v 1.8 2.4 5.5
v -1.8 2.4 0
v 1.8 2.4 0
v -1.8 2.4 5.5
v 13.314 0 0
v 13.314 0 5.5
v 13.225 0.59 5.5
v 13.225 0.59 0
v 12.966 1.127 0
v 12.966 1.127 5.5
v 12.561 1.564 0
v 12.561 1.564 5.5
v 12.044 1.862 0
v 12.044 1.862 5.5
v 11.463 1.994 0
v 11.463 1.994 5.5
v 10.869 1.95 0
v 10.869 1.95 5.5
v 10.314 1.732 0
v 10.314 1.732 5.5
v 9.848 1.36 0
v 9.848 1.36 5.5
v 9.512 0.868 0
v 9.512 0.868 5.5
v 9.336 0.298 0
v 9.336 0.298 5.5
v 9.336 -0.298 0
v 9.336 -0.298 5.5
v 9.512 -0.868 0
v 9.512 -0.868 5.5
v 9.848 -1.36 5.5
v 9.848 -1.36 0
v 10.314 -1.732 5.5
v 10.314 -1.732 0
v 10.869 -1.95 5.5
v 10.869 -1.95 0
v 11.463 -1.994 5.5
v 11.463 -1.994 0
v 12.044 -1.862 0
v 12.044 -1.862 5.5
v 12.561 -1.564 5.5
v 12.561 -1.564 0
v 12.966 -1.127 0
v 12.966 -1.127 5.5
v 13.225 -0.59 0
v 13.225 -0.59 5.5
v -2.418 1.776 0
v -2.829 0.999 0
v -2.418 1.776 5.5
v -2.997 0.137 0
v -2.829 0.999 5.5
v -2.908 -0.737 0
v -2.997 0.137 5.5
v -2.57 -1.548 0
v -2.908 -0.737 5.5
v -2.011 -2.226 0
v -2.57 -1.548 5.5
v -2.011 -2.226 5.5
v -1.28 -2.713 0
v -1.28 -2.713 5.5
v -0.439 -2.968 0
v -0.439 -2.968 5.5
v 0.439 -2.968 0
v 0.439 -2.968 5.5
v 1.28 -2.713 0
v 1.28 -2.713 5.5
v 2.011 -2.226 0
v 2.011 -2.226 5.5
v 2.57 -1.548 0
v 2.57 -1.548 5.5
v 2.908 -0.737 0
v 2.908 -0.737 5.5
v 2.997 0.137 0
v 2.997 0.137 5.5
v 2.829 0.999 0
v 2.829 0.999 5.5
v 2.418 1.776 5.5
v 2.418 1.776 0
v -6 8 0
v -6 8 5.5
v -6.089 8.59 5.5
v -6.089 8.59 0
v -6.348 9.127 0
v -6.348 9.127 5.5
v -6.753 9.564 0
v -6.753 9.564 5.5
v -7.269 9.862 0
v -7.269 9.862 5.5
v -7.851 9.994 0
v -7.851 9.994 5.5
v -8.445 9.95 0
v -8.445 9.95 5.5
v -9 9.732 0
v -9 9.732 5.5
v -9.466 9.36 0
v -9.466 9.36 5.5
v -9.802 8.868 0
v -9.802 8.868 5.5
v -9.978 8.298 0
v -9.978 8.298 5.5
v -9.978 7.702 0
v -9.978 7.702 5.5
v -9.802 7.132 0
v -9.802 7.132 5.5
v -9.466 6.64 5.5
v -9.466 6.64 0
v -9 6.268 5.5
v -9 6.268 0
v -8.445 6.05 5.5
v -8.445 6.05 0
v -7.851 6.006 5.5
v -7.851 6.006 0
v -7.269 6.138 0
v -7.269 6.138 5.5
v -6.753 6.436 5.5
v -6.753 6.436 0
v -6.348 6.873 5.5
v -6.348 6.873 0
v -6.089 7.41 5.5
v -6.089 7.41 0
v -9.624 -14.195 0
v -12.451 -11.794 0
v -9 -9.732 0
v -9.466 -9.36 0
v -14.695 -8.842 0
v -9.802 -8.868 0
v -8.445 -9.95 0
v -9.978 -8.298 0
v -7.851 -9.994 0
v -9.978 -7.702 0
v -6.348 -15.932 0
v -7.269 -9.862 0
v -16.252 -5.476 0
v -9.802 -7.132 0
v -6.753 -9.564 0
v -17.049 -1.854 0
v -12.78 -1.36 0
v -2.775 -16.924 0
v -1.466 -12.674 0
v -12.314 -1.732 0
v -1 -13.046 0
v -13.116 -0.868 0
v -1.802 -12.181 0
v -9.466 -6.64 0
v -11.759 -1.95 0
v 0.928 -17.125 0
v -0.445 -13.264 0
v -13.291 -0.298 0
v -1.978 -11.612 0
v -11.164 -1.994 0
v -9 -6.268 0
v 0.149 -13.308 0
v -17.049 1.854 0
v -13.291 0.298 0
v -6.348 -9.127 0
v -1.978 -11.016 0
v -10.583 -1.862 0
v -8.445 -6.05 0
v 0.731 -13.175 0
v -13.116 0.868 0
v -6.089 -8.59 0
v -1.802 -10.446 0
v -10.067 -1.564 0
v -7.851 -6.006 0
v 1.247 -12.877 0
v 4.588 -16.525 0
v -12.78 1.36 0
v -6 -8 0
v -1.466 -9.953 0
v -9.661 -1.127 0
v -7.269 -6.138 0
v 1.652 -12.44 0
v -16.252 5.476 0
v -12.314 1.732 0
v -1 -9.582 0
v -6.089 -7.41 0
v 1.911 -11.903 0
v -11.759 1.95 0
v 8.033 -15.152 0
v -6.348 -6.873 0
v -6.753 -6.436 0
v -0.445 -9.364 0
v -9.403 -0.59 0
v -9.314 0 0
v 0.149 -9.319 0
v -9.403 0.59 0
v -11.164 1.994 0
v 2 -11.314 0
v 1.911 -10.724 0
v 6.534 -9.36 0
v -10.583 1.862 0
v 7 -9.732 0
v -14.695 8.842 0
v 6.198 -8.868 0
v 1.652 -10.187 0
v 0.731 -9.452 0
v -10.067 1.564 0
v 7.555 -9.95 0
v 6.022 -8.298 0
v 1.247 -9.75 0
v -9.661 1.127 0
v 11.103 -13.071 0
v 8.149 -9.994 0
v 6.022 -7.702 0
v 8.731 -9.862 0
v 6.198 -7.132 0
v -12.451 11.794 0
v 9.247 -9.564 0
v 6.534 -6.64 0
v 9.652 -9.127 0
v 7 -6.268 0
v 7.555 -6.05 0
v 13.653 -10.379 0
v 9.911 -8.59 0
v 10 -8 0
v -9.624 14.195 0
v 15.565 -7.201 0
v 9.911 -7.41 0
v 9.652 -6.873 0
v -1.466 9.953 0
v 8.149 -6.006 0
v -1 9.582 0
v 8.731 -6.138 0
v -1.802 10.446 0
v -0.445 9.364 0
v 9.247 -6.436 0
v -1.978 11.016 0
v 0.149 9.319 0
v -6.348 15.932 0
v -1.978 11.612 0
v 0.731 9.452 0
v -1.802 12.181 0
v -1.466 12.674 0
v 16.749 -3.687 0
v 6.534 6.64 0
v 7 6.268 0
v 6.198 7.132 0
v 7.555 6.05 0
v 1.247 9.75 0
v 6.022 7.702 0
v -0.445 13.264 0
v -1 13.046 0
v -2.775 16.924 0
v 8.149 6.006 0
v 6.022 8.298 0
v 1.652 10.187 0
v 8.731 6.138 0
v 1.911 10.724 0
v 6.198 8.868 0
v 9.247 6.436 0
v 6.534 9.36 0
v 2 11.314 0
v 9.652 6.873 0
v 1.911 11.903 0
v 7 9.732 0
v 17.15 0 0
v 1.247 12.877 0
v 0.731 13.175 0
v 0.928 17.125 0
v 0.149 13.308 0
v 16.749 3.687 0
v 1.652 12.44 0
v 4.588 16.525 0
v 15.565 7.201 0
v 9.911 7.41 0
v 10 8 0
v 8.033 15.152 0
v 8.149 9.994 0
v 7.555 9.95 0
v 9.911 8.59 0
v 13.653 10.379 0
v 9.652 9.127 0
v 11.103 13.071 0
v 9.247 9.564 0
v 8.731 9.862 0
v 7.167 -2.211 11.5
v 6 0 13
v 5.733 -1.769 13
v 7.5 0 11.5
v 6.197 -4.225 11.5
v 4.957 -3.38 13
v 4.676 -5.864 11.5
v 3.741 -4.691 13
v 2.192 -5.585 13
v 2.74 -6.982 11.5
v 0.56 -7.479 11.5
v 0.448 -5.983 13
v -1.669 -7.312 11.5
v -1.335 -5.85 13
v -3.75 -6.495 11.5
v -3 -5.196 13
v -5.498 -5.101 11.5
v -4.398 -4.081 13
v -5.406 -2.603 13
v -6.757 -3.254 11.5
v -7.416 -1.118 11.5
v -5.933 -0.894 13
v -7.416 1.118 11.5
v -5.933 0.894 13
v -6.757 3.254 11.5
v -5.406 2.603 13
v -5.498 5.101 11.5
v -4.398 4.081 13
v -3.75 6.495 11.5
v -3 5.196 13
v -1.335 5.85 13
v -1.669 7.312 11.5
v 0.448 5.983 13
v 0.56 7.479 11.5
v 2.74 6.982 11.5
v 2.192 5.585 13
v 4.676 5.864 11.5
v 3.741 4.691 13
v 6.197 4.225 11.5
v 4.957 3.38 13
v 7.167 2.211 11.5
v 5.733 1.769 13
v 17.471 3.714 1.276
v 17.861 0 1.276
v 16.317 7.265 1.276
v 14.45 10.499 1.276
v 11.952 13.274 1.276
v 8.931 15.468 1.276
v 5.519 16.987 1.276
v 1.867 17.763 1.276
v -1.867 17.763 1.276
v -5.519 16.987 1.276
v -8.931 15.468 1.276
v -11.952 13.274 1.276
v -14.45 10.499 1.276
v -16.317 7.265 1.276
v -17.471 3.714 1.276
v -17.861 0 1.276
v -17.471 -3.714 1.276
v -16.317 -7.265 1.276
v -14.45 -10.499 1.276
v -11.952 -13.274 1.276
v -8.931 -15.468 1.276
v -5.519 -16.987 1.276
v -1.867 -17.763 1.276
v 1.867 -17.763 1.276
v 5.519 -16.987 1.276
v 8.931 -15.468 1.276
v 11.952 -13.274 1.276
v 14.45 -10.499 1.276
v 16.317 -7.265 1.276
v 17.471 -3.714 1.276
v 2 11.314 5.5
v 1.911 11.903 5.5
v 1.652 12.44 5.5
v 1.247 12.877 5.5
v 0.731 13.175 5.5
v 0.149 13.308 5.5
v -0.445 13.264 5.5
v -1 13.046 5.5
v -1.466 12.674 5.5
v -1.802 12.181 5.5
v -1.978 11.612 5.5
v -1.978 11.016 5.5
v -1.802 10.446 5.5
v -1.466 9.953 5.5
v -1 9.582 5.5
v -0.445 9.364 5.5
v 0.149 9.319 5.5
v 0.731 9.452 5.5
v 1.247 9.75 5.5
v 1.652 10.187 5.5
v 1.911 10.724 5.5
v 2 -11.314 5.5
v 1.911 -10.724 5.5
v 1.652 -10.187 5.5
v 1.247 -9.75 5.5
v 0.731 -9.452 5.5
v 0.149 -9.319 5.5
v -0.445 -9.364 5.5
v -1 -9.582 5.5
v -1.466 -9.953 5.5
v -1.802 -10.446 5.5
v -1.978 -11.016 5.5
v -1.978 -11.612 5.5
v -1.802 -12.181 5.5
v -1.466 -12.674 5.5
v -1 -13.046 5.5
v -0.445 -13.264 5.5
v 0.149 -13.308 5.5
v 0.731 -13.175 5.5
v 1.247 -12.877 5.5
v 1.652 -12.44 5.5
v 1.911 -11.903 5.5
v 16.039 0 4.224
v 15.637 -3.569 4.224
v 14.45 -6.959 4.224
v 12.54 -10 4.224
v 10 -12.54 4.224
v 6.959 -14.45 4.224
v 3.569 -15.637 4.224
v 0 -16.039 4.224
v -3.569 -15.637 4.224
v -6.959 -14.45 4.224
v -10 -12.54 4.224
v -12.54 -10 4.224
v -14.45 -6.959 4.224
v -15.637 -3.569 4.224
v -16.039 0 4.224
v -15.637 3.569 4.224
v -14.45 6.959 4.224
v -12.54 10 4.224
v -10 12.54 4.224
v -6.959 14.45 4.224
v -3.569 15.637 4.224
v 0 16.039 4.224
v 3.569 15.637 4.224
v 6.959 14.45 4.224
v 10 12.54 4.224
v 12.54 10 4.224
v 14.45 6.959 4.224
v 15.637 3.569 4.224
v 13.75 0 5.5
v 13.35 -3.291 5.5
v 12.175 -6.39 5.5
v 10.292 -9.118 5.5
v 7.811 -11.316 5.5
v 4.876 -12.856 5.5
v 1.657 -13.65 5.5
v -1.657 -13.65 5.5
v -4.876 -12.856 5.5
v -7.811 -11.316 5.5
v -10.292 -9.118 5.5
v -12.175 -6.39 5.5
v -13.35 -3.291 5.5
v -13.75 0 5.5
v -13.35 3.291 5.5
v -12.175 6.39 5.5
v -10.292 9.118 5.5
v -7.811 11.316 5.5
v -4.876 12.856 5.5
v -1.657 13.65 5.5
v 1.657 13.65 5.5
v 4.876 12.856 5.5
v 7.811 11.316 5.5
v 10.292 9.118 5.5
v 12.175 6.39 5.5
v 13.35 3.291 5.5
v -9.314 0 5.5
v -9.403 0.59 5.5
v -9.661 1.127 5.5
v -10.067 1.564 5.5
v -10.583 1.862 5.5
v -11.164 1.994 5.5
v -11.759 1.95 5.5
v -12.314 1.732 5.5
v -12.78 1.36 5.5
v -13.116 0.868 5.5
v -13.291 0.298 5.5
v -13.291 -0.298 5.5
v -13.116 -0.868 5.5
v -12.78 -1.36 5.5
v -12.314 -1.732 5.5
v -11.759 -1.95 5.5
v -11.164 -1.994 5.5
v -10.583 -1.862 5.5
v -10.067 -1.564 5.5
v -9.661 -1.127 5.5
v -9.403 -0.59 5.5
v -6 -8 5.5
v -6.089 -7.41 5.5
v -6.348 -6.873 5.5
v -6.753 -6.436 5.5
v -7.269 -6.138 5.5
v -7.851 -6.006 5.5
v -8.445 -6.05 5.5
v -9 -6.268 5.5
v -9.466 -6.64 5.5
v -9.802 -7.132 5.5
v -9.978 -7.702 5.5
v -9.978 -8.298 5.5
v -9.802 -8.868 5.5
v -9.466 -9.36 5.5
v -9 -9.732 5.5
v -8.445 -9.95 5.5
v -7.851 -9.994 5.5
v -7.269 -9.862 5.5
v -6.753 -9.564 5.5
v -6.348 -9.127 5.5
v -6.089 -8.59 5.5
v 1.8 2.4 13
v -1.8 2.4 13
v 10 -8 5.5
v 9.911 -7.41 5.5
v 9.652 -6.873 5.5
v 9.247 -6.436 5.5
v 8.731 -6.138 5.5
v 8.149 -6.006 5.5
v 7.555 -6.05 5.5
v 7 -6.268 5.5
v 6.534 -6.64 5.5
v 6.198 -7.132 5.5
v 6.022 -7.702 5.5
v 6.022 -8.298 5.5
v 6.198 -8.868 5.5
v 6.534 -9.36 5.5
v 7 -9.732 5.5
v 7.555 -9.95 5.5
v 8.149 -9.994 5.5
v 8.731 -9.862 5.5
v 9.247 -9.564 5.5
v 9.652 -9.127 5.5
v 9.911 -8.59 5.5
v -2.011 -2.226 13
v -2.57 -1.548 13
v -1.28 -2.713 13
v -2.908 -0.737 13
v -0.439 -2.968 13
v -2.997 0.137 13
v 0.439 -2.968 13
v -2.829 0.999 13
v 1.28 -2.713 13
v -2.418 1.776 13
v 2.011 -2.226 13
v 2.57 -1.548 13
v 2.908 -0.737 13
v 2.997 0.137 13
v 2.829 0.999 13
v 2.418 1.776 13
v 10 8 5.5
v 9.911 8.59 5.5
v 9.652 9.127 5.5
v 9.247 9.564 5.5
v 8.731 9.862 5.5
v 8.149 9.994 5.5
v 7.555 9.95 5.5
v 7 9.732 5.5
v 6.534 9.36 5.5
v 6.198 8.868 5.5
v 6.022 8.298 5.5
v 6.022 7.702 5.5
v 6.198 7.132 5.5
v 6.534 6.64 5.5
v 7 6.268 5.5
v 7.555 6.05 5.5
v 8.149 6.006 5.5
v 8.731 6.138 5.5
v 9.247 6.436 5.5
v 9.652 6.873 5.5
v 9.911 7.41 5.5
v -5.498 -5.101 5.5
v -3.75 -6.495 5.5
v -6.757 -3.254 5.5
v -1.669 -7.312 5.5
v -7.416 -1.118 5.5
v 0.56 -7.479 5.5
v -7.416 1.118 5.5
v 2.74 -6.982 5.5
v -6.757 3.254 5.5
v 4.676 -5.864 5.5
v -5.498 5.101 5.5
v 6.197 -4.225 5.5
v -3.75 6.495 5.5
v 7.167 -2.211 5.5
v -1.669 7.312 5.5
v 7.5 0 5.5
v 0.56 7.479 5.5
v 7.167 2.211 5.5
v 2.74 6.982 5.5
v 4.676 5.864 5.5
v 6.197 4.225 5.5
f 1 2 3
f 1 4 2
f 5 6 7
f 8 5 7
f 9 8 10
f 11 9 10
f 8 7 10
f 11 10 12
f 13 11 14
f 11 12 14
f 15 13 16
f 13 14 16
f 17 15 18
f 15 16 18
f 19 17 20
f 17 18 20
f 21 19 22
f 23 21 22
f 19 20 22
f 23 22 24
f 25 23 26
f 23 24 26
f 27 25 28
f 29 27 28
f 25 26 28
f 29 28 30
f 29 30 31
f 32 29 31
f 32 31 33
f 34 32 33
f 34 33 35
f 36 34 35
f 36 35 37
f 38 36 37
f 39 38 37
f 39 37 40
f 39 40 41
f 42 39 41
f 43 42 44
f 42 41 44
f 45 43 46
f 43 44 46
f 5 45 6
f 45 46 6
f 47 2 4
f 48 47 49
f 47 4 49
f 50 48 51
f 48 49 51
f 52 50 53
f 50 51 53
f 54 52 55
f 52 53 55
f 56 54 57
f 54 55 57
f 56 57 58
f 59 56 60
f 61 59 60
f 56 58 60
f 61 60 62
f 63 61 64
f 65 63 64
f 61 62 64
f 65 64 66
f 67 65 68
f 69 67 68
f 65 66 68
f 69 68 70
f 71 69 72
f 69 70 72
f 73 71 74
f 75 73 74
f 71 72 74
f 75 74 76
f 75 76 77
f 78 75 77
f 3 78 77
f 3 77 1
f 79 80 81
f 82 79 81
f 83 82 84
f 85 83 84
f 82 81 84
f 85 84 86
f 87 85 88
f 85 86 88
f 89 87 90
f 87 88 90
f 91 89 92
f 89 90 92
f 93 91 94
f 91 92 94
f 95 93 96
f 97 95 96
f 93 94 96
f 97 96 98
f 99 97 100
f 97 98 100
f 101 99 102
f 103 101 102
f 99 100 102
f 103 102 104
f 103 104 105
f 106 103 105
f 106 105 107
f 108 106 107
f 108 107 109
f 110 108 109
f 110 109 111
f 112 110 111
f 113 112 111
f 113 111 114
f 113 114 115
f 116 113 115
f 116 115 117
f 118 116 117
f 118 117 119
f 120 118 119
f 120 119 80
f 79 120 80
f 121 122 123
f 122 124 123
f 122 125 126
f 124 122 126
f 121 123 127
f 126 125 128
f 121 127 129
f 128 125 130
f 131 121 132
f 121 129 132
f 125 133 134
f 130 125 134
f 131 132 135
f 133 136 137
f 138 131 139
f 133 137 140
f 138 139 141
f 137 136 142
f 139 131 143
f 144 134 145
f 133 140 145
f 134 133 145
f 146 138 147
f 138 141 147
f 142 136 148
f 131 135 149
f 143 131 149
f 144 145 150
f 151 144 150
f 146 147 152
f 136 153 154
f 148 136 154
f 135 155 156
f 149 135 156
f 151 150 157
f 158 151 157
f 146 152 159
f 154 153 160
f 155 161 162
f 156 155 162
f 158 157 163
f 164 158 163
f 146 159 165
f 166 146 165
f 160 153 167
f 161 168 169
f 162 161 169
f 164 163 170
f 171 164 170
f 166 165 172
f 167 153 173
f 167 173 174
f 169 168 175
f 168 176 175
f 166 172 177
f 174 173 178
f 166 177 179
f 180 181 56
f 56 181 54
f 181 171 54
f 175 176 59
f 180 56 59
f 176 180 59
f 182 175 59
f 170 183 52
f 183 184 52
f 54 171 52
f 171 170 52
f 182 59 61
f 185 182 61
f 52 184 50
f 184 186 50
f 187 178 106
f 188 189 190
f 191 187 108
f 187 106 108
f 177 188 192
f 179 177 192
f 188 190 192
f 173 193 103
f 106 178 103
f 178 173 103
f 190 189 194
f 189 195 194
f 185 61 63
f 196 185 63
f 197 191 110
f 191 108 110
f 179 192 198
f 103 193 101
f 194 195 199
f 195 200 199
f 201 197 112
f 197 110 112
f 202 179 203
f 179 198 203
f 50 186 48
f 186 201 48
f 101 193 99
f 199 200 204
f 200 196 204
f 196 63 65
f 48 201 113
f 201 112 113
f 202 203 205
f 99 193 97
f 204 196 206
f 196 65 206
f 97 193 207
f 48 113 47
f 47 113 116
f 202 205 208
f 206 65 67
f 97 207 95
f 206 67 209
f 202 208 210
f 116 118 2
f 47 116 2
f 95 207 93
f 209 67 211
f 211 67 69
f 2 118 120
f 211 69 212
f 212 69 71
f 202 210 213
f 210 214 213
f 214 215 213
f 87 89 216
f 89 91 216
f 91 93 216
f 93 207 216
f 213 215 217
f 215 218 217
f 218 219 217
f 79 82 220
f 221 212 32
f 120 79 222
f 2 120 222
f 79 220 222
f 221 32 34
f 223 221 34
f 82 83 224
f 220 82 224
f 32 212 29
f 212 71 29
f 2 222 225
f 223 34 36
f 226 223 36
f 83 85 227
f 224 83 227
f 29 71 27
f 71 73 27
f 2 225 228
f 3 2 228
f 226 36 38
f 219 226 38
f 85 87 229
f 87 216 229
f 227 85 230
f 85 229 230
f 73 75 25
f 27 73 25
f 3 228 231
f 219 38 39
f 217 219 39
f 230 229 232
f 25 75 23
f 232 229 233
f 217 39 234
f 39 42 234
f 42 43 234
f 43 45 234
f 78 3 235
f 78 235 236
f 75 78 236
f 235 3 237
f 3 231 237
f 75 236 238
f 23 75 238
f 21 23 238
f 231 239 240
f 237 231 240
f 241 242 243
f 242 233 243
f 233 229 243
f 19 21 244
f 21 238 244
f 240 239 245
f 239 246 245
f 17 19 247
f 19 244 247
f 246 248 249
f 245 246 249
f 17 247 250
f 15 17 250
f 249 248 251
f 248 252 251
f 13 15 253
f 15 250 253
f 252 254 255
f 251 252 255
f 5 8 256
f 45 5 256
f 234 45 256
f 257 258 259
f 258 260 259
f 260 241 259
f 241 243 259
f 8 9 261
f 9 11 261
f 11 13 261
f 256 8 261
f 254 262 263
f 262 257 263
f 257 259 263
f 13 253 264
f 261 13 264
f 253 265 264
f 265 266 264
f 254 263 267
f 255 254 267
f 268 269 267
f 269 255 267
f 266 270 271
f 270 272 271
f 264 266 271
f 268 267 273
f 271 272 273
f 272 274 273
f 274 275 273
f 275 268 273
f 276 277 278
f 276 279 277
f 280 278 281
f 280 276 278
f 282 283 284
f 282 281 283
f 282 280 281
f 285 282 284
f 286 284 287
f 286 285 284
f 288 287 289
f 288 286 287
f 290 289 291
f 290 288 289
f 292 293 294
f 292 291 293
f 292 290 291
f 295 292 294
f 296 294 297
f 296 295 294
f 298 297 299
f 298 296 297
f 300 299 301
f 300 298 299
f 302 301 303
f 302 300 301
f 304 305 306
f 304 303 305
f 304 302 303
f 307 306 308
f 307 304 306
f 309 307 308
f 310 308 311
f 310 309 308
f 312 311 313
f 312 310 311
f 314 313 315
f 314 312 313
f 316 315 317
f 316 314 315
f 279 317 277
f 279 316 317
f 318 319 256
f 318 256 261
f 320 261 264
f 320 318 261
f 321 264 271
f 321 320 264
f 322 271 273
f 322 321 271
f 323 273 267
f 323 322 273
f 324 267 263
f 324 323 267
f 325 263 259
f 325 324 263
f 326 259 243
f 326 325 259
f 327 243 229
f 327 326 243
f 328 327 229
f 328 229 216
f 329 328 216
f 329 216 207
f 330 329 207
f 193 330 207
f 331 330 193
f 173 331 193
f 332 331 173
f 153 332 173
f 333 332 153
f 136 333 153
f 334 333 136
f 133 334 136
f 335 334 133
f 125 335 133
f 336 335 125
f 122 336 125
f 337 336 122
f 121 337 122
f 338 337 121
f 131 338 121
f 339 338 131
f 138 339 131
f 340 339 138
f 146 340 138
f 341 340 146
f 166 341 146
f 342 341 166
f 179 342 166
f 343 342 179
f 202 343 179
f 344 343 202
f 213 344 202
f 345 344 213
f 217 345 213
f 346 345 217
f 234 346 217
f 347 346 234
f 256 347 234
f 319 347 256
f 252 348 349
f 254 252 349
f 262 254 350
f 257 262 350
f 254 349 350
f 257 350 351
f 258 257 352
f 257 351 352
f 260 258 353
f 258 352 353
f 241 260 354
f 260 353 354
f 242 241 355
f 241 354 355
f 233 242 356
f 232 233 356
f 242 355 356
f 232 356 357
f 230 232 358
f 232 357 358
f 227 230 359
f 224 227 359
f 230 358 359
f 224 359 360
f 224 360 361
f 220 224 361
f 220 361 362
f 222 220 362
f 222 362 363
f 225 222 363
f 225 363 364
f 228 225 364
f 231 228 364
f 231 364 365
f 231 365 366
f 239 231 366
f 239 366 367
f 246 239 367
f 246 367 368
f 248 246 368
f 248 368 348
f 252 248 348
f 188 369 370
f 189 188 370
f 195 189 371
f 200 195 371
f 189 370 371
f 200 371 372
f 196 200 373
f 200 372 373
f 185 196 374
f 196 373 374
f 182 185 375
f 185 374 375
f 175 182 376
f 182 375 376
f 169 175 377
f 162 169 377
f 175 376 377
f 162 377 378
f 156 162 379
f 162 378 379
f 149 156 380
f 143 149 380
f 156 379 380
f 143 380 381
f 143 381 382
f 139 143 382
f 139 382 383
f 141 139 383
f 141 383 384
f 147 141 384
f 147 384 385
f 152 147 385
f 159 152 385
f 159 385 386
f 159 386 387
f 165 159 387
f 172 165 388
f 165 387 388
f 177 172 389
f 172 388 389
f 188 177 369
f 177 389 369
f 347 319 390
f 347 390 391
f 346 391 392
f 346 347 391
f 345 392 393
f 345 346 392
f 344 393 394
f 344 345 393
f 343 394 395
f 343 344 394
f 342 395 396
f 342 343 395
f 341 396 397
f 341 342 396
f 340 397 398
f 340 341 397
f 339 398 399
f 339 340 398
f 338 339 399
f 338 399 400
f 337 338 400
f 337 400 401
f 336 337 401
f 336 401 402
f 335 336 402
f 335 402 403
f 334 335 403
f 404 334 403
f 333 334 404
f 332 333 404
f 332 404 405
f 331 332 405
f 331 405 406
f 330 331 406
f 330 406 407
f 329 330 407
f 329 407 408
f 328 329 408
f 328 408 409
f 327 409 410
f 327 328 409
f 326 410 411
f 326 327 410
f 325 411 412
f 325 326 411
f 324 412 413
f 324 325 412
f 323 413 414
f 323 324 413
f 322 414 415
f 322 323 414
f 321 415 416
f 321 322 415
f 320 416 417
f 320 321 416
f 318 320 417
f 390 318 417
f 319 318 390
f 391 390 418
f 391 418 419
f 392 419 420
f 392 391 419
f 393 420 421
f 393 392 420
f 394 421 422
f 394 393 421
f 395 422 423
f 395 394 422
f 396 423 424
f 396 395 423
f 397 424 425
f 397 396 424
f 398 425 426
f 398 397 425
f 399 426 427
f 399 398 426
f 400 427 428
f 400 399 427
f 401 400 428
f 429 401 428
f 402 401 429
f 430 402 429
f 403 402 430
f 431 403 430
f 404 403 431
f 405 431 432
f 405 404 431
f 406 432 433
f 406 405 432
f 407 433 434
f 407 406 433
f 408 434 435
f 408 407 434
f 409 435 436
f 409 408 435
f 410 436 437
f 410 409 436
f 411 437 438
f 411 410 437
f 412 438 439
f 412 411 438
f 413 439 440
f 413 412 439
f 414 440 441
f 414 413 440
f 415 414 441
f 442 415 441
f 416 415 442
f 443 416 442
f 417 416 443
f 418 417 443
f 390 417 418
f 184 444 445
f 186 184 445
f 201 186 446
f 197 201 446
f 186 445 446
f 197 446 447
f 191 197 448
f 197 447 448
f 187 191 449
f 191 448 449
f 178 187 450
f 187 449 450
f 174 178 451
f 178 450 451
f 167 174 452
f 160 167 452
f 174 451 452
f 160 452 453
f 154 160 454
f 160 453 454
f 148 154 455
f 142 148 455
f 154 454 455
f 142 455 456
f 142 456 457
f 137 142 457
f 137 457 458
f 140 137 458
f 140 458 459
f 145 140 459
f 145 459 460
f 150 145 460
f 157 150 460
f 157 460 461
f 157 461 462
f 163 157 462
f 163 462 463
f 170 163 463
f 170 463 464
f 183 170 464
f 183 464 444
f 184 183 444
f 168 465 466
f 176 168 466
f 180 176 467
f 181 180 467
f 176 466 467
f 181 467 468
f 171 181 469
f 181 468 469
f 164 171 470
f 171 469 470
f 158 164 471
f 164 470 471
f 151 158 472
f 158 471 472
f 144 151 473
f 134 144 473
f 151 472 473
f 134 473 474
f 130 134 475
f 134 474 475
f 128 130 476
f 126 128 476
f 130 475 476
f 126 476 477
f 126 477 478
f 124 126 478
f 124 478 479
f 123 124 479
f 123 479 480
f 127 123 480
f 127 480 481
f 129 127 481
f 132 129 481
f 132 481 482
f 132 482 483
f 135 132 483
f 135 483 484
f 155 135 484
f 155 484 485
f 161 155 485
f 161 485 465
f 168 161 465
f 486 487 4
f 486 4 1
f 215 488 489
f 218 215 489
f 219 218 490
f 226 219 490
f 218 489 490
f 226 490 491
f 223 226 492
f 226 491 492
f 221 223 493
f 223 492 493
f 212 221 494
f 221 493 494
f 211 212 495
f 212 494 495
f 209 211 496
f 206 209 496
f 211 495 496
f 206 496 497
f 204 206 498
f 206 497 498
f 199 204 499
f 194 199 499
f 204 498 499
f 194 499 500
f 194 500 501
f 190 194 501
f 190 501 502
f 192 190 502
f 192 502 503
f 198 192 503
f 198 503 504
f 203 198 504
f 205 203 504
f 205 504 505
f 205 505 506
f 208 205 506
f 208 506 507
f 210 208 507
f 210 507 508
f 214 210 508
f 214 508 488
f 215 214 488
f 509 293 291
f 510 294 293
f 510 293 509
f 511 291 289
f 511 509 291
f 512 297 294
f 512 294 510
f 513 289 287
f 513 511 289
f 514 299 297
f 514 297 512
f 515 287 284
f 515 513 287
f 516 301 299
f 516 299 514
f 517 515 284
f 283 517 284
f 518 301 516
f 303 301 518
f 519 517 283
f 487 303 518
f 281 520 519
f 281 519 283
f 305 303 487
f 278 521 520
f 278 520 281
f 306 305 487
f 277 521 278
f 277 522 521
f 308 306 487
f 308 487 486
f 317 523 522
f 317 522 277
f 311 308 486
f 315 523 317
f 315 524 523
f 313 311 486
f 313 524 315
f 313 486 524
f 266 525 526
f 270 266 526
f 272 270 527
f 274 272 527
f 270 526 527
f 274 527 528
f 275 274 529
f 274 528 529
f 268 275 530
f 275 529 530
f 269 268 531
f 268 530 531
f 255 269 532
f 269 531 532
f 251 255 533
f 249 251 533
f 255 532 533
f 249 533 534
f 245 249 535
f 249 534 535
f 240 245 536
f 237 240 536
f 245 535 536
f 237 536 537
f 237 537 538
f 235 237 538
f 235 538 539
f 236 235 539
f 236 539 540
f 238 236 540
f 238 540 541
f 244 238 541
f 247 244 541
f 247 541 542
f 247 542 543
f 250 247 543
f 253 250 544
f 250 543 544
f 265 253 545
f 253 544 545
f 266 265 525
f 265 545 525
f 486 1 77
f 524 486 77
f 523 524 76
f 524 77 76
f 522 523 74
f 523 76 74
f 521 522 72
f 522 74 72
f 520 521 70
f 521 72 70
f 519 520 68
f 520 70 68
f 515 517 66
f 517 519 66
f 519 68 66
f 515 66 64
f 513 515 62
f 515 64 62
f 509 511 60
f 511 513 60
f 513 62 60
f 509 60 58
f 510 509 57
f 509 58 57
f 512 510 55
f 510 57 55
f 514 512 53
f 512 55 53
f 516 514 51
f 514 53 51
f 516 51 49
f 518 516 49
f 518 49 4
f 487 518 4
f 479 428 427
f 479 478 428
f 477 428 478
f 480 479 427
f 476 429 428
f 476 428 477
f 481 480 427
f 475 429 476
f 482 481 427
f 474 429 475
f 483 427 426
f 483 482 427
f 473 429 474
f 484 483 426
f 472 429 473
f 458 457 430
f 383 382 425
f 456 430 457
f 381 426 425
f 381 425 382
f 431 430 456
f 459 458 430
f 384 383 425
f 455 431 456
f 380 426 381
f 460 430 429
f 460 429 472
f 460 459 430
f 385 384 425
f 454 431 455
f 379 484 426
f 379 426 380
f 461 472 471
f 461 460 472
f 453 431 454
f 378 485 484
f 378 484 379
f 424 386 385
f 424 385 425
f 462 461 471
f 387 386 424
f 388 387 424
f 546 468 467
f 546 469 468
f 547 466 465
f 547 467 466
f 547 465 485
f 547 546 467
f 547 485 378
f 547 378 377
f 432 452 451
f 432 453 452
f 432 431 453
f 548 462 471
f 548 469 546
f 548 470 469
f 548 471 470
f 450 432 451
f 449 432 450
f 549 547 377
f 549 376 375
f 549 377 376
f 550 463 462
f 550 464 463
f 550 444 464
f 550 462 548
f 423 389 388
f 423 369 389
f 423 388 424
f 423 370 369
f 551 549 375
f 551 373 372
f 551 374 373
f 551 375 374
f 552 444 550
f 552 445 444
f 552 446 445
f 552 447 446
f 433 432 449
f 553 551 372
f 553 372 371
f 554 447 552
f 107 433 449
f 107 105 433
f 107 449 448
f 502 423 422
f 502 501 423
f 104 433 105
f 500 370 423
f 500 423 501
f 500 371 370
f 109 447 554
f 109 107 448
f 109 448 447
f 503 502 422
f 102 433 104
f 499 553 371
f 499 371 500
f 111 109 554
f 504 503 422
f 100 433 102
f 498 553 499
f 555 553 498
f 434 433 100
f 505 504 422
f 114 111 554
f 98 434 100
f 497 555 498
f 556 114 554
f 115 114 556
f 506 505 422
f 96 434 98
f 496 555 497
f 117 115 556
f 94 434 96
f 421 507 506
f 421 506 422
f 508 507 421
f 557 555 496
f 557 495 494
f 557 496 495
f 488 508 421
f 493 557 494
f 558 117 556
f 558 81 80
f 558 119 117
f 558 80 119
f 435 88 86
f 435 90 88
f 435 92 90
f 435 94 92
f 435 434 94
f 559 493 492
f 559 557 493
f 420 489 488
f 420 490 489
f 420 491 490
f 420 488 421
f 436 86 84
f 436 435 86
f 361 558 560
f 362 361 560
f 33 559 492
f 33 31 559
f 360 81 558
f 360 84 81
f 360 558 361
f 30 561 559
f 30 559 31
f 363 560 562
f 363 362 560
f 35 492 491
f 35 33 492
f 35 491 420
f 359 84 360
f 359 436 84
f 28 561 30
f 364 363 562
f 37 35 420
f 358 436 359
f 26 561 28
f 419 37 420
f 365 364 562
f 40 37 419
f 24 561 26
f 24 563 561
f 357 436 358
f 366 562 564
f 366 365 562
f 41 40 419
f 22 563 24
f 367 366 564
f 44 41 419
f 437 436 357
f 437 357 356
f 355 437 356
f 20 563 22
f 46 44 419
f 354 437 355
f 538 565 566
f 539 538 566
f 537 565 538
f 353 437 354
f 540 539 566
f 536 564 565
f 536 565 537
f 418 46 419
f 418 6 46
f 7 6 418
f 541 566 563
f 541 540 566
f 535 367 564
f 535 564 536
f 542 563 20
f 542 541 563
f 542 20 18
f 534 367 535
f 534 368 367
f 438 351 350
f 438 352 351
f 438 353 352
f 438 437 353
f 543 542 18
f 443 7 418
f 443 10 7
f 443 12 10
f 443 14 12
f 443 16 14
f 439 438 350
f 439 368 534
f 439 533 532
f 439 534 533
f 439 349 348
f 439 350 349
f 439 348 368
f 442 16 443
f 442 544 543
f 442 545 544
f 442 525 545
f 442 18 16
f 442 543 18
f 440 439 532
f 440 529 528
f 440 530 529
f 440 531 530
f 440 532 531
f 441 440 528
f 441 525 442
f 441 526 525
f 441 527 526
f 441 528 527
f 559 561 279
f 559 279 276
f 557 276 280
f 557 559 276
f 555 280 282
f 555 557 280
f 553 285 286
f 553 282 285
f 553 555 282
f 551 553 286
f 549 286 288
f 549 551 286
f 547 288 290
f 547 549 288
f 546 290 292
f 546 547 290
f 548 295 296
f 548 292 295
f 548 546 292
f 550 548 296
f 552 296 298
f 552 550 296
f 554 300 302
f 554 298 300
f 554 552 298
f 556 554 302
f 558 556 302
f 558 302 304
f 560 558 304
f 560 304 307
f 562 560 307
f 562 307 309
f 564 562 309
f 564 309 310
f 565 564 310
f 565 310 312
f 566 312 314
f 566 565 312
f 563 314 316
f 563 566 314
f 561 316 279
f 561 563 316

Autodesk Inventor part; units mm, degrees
ref_plane "YZ Plane" through (0, 0, 0) normal (1, 0, 0) x (0, 1, 0)
ref_plane "XZ Plane" through (0, 0, 0) normal (0, 1, 0) x (-1, 0, 0)
sketch "Sketch1" plane through (0, 0, 0) normal (0, 0, 1) x (1, 0, 0)
  circle A0 centre (0, 0) radius 18.65
  dimension "d0" = 37.3
ref_plane "Work Plane1" through (0, 0, 5.5) normal (0, 0, 1) x (1, 0, 0)
sketch "Sketch2" plane through (0, 0, 5.5) normal (0, 0, 1) x (1, 0, 0)
  circle A0 centre (0, 0) radius 15.25
  dimension "d2" = 30.5
loft "Loft1" add profiles "Sketch1", "Sketch2"
sketch "Sketch3" plane through (0, 0, 5.5) normal (0, 0, 1) x (1, 0, 0)
  circle A0 centre (0, 0) radius 3
  line L0 (0, 0) -> (0, -3) construction
  line L1 (-1.8, 2.4) -> (1.8, 2.4)
  dimension "d7" = 6
  dimension "d8" = 5.4
extrude "Extrusion1" cut sketch "Sketch3" against normal through all contours A0 L1 picked at (0.3021, 0.4498)
chamfer "Chamfer1" distance 1.5 angle 45 1 edges at (-18.65, 0, 0)
chamfer "Chamfer2" distance 1.5 angle 45 1 edges at (-15.25, 0, 5.5)
sketch "Sketch4" plane through (0, 0, 5.5) normal (0, 0, 1) x (1, 0, 0)
  circle A0 centre (0, 0) radius 7.5
  arc A1 (-1.8, 2.4) -> (1.8, 2.4) centre (0, 0) ccw projected
  line L0 (-1.8, 2.4) -> (1.8, 2.4) projected
  dimension "d17" = 15
extrude "Extrusion2" add sketch "Sketch4" along normal blind 7.5
chamfer "Chamfer3" distance 1.5 angle 45 1 edges at (-7.5, 0, 13)
sketch "Sketch5" plane through (0, 0, 5.5) normal (0, 0, 1) x (1, 0, 0)
  circle A0 centre (0, 11.3137) radius 2
  circle A1 centre (-8, 8) radius 2
  circle A2 centre (-8, -8) radius 2
  line L0 (-8, 8) -> (-8, -8) construction
  circle A3 centre (0, 0) radius 17.8613 projected
  line L1 (-17.8613, 0) -> (0, 0) construction
  circle A4 centre (-11.3137, 0) radius 2
  circle A5 centre (0, 0) radius 11.3137 construction
  line L2 (0, 0) -> (0, 17.8613) construction
  circle A6 centre (0, -11.3137) radius 2
  circle A7 centre (0, 0) radius 7.5 projected
  line L3 (0, 0) -> (0, -17.8613) construction
  circle A8 centre (8, 8) radius 2
  circle A9 centre (8, -8) radius 2
  circle A10 centre (11.3137, 0) radius 2
  point P0 (-8, 0)
  dimension "d23" = 4
  dimension "d24" = 16
  dimension "d25" = 16
extrude "Extrusion3" cut sketch "Sketch5" against normal through all contours A0 | A1 | A2 | A4 | A6 | A8 | A9 | A10
properties part number "ShoulderMiterGear" material "Aluminum 6061"
